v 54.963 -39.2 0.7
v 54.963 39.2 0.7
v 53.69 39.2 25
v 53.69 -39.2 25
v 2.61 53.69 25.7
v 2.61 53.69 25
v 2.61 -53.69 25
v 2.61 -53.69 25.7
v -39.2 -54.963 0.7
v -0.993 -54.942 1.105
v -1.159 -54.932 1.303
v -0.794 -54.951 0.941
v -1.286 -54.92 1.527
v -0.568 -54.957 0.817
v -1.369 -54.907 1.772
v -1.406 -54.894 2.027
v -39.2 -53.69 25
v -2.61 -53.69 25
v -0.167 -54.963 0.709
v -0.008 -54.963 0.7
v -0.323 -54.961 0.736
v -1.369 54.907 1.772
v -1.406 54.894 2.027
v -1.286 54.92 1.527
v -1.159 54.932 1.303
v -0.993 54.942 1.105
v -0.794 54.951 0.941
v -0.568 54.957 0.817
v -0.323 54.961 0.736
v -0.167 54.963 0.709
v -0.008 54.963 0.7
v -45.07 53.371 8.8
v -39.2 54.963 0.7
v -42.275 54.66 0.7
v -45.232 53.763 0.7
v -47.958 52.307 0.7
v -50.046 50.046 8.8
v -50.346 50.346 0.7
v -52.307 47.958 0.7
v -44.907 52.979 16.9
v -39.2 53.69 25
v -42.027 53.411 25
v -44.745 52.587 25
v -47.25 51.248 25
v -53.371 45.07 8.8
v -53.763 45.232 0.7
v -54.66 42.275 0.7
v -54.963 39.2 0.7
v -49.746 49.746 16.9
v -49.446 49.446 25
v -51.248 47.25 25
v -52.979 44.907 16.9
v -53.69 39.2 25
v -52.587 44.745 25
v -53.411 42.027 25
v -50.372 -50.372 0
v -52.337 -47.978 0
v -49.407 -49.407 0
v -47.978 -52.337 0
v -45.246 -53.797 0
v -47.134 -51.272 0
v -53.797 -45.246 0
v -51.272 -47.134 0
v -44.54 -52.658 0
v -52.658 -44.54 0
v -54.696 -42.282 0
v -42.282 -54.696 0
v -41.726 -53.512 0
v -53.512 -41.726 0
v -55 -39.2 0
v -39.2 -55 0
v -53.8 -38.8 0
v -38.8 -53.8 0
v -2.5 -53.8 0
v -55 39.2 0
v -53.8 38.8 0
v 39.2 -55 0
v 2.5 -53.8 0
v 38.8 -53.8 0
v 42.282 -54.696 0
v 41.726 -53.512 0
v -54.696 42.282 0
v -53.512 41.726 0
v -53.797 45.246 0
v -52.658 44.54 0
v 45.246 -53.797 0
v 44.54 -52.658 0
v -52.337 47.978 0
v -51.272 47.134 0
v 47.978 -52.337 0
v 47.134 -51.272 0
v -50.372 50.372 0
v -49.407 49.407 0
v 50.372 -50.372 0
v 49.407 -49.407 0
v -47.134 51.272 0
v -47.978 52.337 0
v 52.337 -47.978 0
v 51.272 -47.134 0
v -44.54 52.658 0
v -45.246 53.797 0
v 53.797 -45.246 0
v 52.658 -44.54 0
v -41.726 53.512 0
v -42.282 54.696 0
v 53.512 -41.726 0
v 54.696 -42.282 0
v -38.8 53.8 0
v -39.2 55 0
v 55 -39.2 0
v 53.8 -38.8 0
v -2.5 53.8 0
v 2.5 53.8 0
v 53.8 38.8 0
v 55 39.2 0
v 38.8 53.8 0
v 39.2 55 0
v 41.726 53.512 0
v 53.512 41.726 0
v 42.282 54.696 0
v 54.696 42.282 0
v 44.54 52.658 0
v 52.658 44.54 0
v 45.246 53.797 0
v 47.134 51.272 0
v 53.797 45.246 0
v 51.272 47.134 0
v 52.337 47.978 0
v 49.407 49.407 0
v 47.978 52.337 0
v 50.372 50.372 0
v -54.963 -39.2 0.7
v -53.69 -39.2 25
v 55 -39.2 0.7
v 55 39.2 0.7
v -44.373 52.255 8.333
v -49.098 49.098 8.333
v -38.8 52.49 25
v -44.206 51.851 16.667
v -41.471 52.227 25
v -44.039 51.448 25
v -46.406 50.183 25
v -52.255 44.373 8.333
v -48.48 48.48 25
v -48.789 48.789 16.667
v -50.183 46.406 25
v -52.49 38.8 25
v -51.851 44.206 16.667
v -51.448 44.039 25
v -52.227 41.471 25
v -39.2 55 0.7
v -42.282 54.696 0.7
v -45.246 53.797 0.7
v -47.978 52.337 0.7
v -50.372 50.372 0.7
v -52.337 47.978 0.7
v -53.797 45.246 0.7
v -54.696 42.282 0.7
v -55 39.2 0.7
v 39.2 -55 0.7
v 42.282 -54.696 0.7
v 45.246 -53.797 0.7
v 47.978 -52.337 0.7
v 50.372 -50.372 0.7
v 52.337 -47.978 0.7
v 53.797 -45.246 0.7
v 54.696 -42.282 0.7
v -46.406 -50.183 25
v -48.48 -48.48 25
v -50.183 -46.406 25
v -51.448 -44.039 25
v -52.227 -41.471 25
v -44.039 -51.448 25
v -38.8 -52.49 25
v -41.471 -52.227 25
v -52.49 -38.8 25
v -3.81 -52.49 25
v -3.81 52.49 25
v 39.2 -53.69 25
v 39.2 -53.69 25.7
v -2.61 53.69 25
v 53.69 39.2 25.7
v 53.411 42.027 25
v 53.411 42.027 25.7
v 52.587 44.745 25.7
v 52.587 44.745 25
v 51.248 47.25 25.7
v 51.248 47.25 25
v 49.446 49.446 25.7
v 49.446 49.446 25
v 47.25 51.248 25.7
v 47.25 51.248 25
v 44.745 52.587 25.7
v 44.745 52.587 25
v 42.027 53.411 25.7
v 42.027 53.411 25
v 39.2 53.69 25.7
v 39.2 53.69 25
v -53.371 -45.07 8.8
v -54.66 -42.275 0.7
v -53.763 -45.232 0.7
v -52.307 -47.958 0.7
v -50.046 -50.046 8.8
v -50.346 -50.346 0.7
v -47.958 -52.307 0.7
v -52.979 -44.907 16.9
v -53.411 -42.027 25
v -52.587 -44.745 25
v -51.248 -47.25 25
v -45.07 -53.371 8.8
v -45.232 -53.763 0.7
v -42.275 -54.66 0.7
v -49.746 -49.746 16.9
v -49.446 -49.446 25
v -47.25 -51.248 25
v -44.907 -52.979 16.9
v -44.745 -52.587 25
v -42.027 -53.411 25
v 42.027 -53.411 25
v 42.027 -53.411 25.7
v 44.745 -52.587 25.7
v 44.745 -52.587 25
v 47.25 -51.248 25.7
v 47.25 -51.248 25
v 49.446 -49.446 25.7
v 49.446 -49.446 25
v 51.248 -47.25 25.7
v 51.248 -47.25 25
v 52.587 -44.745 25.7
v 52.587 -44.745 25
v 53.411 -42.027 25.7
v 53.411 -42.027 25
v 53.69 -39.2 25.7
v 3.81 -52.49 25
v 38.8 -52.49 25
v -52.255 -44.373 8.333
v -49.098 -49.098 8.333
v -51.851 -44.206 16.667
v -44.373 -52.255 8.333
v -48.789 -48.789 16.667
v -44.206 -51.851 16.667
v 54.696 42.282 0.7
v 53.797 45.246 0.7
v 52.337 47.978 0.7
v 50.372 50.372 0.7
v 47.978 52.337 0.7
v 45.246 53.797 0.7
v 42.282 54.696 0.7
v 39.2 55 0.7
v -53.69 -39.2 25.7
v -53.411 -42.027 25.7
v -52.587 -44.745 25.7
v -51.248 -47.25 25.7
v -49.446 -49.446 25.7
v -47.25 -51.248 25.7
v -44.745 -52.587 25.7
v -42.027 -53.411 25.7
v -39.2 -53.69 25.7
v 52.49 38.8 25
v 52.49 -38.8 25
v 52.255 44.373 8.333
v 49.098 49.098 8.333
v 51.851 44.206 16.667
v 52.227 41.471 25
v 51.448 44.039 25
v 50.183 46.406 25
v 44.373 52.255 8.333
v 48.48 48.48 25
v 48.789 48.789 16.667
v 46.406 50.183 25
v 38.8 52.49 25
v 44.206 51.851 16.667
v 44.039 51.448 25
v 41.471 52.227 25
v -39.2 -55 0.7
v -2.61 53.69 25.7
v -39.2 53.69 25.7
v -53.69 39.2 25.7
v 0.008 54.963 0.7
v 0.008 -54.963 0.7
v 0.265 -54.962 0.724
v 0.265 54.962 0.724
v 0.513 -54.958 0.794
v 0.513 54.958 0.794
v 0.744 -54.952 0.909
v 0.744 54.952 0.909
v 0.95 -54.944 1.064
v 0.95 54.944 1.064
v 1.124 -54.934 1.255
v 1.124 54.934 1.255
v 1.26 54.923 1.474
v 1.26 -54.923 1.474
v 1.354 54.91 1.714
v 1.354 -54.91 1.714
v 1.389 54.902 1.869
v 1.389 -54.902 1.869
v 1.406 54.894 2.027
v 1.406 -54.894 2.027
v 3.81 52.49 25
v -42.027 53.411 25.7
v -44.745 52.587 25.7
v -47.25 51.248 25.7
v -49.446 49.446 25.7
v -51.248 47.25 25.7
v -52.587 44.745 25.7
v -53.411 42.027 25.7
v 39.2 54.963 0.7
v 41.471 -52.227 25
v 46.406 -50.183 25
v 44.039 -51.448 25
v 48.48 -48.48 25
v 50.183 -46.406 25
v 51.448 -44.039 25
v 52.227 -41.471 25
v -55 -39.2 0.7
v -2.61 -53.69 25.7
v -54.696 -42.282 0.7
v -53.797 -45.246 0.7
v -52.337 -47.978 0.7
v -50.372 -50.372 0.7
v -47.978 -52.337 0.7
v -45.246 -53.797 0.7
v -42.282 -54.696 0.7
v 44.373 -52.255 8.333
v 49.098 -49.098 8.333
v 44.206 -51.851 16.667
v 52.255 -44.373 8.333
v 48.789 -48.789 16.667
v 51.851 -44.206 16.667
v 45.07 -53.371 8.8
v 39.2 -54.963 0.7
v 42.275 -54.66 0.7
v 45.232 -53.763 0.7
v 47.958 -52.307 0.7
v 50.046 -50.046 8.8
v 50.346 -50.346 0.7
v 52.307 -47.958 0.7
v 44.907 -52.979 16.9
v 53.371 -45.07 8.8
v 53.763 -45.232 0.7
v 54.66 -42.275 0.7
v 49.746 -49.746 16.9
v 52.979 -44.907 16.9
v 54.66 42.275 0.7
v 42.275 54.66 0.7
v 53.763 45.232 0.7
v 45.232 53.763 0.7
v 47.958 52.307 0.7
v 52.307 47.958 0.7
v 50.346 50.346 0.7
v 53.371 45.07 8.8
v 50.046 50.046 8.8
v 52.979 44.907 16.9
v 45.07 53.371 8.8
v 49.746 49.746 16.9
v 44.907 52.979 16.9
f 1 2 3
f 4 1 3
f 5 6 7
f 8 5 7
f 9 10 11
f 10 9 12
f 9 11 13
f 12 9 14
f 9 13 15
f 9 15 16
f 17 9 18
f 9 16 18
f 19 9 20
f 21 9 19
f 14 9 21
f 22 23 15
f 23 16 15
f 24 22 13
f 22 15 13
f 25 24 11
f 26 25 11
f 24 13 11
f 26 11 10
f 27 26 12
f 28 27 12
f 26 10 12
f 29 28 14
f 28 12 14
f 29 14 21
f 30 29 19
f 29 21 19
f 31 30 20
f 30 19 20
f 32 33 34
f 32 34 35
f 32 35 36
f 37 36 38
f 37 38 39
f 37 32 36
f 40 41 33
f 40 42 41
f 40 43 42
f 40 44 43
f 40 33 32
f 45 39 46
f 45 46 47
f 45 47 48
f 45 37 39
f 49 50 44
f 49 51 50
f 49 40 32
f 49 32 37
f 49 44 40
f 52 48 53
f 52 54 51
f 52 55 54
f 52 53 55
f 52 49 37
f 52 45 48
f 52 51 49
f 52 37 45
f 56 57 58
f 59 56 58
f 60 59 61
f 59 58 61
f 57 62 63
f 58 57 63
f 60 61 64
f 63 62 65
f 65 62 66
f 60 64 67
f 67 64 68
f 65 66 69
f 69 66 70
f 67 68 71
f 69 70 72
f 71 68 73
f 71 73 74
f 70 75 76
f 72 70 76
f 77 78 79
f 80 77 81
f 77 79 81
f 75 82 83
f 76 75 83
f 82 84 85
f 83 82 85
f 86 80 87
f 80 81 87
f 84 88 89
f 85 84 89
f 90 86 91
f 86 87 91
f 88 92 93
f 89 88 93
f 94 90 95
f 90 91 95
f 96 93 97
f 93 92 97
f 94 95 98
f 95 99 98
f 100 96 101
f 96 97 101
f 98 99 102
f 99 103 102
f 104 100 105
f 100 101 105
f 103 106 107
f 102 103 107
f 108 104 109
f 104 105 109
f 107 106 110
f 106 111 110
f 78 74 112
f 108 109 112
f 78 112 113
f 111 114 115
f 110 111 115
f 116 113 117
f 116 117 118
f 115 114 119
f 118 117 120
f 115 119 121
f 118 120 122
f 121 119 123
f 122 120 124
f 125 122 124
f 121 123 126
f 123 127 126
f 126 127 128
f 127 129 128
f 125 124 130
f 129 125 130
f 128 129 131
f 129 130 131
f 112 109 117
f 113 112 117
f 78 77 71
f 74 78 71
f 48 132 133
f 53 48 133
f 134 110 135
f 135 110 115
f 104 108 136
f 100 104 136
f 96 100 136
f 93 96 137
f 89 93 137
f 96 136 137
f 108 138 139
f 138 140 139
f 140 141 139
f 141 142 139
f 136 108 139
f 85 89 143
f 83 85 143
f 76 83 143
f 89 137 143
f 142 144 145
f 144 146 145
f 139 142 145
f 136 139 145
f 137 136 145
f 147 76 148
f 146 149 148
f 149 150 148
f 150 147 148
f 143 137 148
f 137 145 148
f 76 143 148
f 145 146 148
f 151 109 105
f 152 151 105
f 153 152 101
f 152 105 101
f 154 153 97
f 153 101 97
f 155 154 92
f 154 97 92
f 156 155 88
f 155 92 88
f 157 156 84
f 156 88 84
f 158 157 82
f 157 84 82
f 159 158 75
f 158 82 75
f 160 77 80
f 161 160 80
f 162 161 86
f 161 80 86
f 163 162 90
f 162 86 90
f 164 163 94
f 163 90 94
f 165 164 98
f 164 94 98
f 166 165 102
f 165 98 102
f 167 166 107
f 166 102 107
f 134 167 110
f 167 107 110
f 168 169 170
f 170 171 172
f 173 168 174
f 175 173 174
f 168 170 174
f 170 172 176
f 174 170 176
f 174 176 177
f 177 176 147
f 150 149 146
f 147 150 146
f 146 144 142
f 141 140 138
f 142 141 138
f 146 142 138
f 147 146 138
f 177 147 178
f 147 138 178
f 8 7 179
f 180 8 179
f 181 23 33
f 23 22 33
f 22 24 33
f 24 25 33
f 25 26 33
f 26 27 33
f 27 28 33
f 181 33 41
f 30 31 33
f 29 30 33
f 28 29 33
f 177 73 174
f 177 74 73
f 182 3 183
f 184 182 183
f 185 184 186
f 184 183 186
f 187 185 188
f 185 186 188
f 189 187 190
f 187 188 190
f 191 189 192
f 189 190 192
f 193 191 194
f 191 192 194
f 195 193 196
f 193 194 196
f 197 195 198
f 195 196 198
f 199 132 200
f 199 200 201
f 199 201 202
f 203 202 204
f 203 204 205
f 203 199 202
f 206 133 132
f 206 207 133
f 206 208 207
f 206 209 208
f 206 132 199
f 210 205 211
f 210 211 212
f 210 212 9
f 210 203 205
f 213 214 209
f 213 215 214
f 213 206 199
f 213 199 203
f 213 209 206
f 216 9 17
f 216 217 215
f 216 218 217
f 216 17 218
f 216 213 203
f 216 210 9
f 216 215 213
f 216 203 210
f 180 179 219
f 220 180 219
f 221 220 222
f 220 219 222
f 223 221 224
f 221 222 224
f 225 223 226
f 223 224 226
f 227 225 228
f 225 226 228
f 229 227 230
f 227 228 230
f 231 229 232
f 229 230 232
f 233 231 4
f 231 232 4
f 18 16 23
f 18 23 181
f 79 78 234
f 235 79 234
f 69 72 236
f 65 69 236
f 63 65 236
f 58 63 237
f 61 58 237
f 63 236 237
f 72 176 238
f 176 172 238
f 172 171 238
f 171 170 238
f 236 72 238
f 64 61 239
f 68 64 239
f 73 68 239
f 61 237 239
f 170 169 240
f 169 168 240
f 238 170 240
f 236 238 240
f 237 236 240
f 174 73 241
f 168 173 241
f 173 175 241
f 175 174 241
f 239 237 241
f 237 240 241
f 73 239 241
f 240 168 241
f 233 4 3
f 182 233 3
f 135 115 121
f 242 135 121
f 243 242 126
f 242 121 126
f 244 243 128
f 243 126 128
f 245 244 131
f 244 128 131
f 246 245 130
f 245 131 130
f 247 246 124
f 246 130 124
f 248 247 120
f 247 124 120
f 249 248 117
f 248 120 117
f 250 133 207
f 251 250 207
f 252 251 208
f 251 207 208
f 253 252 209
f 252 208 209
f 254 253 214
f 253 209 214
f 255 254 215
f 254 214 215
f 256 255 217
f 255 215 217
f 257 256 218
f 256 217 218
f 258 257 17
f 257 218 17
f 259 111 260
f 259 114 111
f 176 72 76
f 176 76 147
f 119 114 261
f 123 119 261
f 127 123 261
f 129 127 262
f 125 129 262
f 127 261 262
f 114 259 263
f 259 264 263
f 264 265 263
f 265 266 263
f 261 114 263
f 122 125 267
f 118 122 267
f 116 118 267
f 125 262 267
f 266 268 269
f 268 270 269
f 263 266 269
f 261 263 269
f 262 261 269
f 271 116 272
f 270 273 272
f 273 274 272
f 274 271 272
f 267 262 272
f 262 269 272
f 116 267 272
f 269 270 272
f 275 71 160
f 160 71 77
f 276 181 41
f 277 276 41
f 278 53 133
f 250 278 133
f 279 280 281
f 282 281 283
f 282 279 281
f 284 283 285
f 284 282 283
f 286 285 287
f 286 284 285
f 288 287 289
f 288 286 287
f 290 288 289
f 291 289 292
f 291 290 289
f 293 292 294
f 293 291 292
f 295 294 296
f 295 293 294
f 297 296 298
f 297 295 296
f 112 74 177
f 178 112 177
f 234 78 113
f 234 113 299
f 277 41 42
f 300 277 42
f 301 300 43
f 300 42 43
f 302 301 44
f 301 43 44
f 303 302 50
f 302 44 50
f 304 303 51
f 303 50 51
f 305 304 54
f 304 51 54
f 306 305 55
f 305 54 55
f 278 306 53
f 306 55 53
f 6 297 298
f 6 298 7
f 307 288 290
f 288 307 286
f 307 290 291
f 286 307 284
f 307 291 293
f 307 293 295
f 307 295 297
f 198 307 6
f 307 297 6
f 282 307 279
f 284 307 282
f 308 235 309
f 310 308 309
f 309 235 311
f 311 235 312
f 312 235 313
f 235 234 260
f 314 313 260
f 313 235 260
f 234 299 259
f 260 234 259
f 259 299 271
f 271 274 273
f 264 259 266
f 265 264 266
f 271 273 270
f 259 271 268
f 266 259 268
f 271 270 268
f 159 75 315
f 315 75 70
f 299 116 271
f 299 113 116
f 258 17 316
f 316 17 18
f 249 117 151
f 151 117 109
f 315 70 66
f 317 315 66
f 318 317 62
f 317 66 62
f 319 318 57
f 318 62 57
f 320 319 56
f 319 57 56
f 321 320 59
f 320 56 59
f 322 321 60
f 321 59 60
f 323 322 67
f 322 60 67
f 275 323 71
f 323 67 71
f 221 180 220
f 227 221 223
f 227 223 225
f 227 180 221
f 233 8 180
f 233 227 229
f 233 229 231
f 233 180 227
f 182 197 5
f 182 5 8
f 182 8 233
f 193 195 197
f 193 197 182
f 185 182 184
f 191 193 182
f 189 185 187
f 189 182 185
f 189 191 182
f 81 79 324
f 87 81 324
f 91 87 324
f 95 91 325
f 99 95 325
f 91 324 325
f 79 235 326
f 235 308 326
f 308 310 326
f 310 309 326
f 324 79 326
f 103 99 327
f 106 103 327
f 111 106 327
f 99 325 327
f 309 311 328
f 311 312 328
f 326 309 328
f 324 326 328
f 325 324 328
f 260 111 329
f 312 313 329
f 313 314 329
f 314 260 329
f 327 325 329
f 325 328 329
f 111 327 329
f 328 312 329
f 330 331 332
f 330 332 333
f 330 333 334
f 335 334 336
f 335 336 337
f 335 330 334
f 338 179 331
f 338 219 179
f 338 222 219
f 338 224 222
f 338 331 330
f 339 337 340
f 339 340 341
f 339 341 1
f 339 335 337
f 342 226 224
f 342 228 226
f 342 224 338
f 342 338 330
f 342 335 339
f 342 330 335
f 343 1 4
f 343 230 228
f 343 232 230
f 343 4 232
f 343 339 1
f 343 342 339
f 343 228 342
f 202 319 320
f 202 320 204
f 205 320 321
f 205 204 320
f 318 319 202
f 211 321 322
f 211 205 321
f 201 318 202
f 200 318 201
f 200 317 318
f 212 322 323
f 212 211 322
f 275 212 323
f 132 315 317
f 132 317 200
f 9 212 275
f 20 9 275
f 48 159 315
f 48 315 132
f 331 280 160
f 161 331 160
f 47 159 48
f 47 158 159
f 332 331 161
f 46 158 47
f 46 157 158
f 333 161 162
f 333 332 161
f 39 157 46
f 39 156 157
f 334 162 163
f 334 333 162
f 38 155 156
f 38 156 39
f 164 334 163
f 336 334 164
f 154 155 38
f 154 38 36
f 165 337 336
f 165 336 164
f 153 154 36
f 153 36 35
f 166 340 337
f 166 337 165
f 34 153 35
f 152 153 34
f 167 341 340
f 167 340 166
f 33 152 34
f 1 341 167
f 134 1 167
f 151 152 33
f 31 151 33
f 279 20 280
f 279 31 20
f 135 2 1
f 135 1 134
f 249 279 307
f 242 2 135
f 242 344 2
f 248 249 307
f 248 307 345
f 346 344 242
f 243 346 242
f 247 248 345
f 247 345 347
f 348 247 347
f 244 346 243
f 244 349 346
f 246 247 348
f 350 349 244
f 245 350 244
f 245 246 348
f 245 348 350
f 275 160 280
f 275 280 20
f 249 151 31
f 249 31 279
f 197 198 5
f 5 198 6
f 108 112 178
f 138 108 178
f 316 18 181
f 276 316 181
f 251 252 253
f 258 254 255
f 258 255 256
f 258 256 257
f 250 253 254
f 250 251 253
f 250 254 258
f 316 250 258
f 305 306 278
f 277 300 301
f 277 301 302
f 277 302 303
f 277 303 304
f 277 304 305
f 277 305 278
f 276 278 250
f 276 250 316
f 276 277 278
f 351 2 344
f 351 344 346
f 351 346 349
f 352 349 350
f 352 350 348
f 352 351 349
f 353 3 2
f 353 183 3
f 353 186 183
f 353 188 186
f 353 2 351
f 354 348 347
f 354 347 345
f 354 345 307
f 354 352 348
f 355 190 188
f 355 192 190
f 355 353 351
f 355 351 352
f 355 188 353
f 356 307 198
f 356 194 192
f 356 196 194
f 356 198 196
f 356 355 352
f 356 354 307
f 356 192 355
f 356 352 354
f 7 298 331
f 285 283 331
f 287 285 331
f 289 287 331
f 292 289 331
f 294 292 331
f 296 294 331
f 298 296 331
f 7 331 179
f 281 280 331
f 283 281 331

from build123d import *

# Parameters (mm, degrees)
F0_W     = 1.2
F0_H     = 1.2
F0_W_2   = 2.6
F0_H_2   = 107.6
F1_DEPTH = 0.7
F2_DEPTH = 25
F2_TAPER = 3
F3_DEPTH = 25
F3_TAPER = 3
F5_DEPTH = 0.7
F7_DEPTH = 0.7
F8_R     = 1.4


with BuildPart() as f1:
    # F0 (on Top) → F1 (new body)
    with BuildSketch(Plane.XY):
        with BuildLine():
            Line((-2.5, 55), (-39.2, 55))
            ThreePointArc((-39.2, 55), (-50.3722871427, 50.3722871427), (-55, 39.2))
            Line((-55, 39.2), (-55, -39.2))
            ThreePointArc((-55, -39.2), (-50.3722871427, -50.3722871427), (-39.2, -55))
            Line((-39.2, -55), (-2.5, -55))
            Line((-2.5, -55), (-2.5, -53.8))
            Line((-2.5, -53.8), (-38.8, -53.8))
            ThreePointArc((-38.8, -53.8), (-49.4066017178, -49.4066017178), (-53.8, -38.8))
            Line((-53.8, -38.8), (-53.8, 38.8))
            ThreePointArc((-53.8, 38.8), (-49.4066017178, 49.4066017178), (-38.8, 53.8))
            Line((-38.8, 53.8), (-2.5, 53.8))
            Line((-2.5, 53.8), (-2.5, 55))
        make_face()
        with Locations((-1.9, 54.4)):
            Rectangle(F0_W, F0_H)
        with Locations((0, 54.4)):
            Rectangle(F0_W_2, F0_H)
        with Locations((1.9, 54.4)):
            Rectangle(F0_W, F0_H)
        with BuildLine():
            Line((39.2, 55), (2.5, 55))
            Line((2.5, 55), (2.5, 53.8))
            Line((2.5, 53.8), (38.8, 53.8))
            ThreePointArc((38.8, 53.8), (49.4066017178, 49.4066017178), (53.8, 38.8))
            Line((53.8, 38.8), (53.8, -38.8))
            ThreePointArc((53.8, -38.8), (49.4066017178, -49.4066017178), (38.8, -53.8))
            Line((38.8, -53.8), (2.5, -53.8))
            Line((2.5, -53.8), (2.5, -55))
            Line((2.5, -55), (39.2, -55))
            ThreePointArc((39.2, -55), (50.3722871427, -50.3722871427), (55, -39.2))
            Line((55, -39.2), (55, 39.2))
            ThreePointArc((55, 39.2), (50.3722871427, 50.3722871427), (39.2, 55))
        make_face()
        with Locations((-1.9, -54.4)):
            Rectangle(F0_W, F0_H)
        with Locations((-1.9, 0)):
            Rectangle(F0_W, F0_H_2)
        with Locations((1.9, 0)):
            Rectangle(F0_W, F0_H_2)
        with Locations((0, -54.4)):
            Rectangle(F0_W_2, F0_H)
        Rectangle(F0_W_2, F0_H_2)
        with Locations((1.9, -54.4)):
            Rectangle(F0_W, F0_H)
    extrude(amount=F1_DEPTH)

    # F0 (on Top) → F2 (join)
    with BuildSketch(Plane.XY):
        with Locations((1.9, 54.4)):
            Rectangle(F0_W, F0_H)
        with Locations((1.9, -54.4)):
            Rectangle(F0_W, F0_H)
        with Locations((1.9, 0)):
            Rectangle(F0_W, F0_H_2)
        with BuildLine():
            Line((39.2, 55), (2.5, 55))
            Line((2.5, 55), (2.5, 53.8))
            Line((2.5, 53.8), (38.8, 53.8))
            ThreePointArc((38.8, 53.8), (49.4066017178, 49.4066017178), (53.8, 38.8))
            Line((53.8, 38.8), (53.8, -38.8))
            ThreePointArc((53.8, -38.8), (49.4066017178, -49.4066017178), (38.8, -53.8))
            Line((38.8, -53.8), (2.5, -53.8))
            Line((2.5, -53.8), (2.5, -55))
            Line((2.5, -55), (39.2, -55))
            ThreePointArc((39.2, -55), (50.3722871427, -50.3722871427), (55, -39.2))
            Line((55, -39.2), (55, 39.2))
            ThreePointArc((55, 39.2), (50.3722871427, 50.3722871427), (39.2, 55))
        make_face()
        with BuildLine():
            Line((38.8, 53.8), (2.5, 53.8))
            Line((2.5, 53.8), (2.5, -53.8))
            Line((2.5, -53.8), (38.8, -53.8))
            ThreePointArc((38.8, -53.8), (49.4066017178, -49.4066017178), (53.8, -38.8))
            Line((53.8, -38.8), (53.8, 38.8))
            ThreePointArc((53.8, 38.8), (49.4066017178, 49.4066017178), (38.8, 53.8))
        make_face()
        with Locations((-1.9, 0)):
            Rectangle(F0_W, F0_H_2)
        with Locations((-1.9, -54.4)):
            Rectangle(F0_W, F0_H)
        with BuildLine():
            Line((-2.5, 55), (-39.2, 55))
            ThreePointArc((-39.2, 55), (-50.3722871427, 50.3722871427), (-55, 39.2))
            Line((-55, 39.2), (-55, -39.2))
            ThreePointArc((-55, -39.2), (-50.3722871427, -50.3722871427), (-39.2, -55))
            Line((-39.2, -55), (-2.5, -55))
            Line((-2.5, -55), (-2.5, -53.8))
            Line((-2.5, -53.8), (-38.8, -53.8))
            ThreePointArc((-38.8, -53.8), (-49.4066017178, -49.4066017178), (-53.8, -38.8))
            Line((-53.8, -38.8), (-53.8, 38.8))
            ThreePointArc((-53.8, 38.8), (-49.4066017178, 49.4066017178), (-38.8, 53.8))
            Line((-38.8, 53.8), (-2.5, 53.8))
            Line((-2.5, 53.8), (-2.5, 55))
        make_face()
        with Locations((-1.9, 54.4)):
            Rectangle(F0_W, F0_H)
        with BuildLine():
            Line((-2.5, -53.8), (-2.5, 53.8))
            Line((-2.5, 53.8), (-38.8, 53.8))
            ThreePointArc((-38.8, 53.8), (-49.4066017178, 49.4066017178), (-53.8, 38.8))
            Line((-53.8, 38.8), (-53.8, -38.8))
            ThreePointArc((-53.8, -38.8), (-49.4066017178, -49.4066017178), (-38.8, -53.8))
            Line((-38.8, -53.8), (-2.5, -53.8))
        make_face()
    extrude(amount=F2_DEPTH, taper=F2_TAPER)

    # F0 (on Top) → F3 (cut)
    with BuildSketch(Plane.XY):
        with BuildLine():
            Line((-2.5, -53.8), (-2.5, 53.8))
            Line((-2.5, 53.8), (-38.8, 53.8))
            ThreePointArc((-38.8, 53.8), (-49.4066017178, 49.4066017178), (-53.8, 38.8))
            Line((-53.8, 38.8), (-53.8, -38.8))
            ThreePointArc((-53.8, -38.8), (-49.4066017178, -49.4066017178), (-38.8, -53.8))
            Line((-38.8, -53.8), (-2.5, -53.8))
        make_face()
        with BuildLine():
            Line((38.8, 53.8), (2.5, 53.8))
            Line((2.5, 53.8), (2.5, -53.8))
            Line((2.5, -53.8), (38.8, -53.8))
            ThreePointArc((38.8, -53.8), (49.4066017178, -49.4066017178), (53.8, -38.8))
            Line((53.8, -38.8), (53.8, 38.8))
            ThreePointArc((53.8, 38.8), (49.4066017178, 49.4066017178), (38.8, 53.8))
        make_face()
    extrude(amount=F3_DEPTH, taper=F3_TAPER, mode=Mode.SUBTRACT)

    # F4 (on face) → F5 (join)
    with BuildSketch(Plane.XY.offset(25)):
        with BuildLine():
            Line((39.2, 53.6898055179), (2.6101944821, 53.6898055179))
            Line((2.6101944821, 53.6898055179), (2.6101944821, -53.6898055179))
            Line((2.6101944821, -53.6898055179), (39.2, -53.6898055179))
            ThreePointArc((39.2, -53.6898055179), (49.4458397398, -49.4458397398), (53.6898055179, -39.2))
            Line((53.6898055179, -39.2), (53.6898055179, 39.2))
            ThreePointArc((53.6898055179, 39.2), (49.4458397398, 49.4458397398), (39.2, 53.6898055179))
        make_face()
    extrude(amount=F5_DEPTH)

    # F6 (on face) → F7 (join)
    with BuildSketch(Plane.XY.offset(25)):
        with BuildLine():
            Line((-39.2, -53.6898055179), (-2.6101944821, -53.6898055179))
            Line((-2.6101944821, -53.6898055179), (-2.6101944821, 53.6898055179))
            Line((-2.6101944821, 53.6898055179), (-39.2, 53.6898055179))
            ThreePointArc((-39.2, 53.6898055179), (-49.4458397398, 49.4458397398), (-53.6898055179, 39.2))
            Line((-53.6898055179, 39.2), (-53.6898055179, -39.2))
            ThreePointArc((-53.6898055179, -39.2), (-49.4458397398, -49.4458397398), (-39.2, -53.6898055179))
        make_face()
    extrude(amount=F7_DEPTH)

    # F8
    f8_edges = [f1.edges().sort_by_distance(p)[0] for p in [
        (1.336685, 0, 0.7),
        (-1.336685, 0, 0.7),
    ]]
    fillet(f8_edges, radius=F8_R)


solid = f1.part
